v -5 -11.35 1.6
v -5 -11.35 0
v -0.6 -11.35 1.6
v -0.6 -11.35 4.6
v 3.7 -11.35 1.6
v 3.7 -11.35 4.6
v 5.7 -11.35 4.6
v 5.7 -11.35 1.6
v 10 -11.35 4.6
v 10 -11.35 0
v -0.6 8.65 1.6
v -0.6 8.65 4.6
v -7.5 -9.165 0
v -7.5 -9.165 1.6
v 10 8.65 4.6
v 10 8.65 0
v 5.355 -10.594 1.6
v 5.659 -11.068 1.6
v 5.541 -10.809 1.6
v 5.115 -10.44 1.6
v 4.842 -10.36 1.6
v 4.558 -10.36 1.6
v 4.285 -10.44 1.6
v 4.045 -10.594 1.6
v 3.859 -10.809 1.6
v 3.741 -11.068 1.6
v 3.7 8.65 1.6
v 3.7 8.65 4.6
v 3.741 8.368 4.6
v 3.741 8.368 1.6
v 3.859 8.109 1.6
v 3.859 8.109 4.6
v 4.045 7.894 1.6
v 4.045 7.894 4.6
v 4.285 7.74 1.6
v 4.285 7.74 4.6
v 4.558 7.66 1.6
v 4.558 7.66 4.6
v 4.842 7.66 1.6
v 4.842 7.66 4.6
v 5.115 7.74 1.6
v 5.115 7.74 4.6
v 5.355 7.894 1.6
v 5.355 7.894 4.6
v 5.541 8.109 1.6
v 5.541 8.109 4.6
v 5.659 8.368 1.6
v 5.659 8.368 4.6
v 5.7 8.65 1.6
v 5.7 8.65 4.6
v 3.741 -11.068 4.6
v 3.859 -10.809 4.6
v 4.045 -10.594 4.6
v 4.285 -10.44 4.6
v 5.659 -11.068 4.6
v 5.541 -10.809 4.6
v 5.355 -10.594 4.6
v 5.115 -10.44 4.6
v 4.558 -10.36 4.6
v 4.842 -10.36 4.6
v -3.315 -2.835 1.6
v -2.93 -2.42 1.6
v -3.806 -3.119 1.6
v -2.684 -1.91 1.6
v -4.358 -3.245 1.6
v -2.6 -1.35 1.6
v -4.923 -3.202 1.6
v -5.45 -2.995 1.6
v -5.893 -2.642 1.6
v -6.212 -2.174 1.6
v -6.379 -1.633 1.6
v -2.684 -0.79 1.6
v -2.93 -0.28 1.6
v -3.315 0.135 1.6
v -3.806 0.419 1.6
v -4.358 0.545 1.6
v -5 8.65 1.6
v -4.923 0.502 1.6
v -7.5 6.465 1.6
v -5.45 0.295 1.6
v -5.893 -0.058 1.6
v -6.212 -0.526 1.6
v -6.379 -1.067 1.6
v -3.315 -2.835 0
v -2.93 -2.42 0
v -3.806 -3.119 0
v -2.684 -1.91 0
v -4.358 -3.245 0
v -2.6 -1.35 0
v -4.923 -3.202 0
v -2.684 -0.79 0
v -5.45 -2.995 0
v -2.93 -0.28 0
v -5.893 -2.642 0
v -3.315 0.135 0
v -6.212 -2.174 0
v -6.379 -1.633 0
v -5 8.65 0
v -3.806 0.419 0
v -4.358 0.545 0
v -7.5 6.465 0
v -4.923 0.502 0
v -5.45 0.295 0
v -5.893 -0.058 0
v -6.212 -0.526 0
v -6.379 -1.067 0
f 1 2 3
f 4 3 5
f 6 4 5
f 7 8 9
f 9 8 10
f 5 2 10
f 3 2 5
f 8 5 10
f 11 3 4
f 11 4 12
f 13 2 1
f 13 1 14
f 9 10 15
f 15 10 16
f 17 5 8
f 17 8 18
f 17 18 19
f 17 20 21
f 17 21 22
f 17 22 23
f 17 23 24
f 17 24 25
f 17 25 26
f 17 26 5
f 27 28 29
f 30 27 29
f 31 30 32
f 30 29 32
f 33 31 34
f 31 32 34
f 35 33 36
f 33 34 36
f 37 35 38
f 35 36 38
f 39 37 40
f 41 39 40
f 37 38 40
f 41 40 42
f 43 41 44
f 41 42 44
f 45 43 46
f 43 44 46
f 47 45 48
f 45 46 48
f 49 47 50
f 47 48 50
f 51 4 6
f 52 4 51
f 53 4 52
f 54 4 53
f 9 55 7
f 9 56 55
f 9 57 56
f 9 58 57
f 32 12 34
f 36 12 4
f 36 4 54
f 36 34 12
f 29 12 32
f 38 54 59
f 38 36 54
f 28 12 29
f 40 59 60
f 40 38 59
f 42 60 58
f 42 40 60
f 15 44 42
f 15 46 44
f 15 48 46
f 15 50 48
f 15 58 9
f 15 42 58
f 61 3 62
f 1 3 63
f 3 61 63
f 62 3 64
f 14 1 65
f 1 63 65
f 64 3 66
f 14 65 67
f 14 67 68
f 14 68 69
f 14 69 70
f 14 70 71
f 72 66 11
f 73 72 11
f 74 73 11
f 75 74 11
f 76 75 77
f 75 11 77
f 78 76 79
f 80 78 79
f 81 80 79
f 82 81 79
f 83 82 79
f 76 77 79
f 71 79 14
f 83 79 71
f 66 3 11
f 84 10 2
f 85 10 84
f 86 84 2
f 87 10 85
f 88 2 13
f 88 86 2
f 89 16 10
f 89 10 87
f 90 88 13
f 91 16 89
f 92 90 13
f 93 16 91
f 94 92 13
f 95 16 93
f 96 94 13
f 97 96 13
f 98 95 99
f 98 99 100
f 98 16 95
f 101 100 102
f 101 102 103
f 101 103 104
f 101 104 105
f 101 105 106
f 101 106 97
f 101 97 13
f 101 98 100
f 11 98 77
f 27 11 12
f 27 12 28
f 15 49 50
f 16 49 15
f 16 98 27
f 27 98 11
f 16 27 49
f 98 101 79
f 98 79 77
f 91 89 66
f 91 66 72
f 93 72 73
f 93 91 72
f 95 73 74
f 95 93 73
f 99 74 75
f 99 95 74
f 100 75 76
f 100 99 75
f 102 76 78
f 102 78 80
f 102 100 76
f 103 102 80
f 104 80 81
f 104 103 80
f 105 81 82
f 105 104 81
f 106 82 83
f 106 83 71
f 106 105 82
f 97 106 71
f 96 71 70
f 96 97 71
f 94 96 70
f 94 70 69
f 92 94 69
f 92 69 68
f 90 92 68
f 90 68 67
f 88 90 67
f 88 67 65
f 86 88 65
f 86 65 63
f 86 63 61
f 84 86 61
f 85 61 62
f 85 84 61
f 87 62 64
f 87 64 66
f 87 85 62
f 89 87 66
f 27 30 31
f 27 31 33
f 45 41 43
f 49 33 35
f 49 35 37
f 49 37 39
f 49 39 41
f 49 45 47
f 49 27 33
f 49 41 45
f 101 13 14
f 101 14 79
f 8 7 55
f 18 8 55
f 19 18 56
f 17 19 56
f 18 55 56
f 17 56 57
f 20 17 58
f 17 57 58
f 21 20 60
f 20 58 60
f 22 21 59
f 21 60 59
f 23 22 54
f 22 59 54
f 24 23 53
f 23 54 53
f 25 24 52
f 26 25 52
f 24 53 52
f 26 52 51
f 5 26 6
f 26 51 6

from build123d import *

# Parameters (mm, degrees)
SKETCH1_R           = 1.9
BOSS_EXTRUDE1_DEPTH = 1.6
SKETCH2_W           = 10.6
SKETCH2_H           = 20
BOSS_EXTRUDE2_DEPTH = 3
SKETCH4_R           = 1
CUT_EXTRUDE1_DEPTH  = 3


with BuildPart() as part:
    # Sketch1 → Boss-Extrude1 (new body)
    with BuildSketch(Plane.XY):
        Polygon((-7.5, 6.464954653), (-5, 8.65), (10, 8.65), (10, -11.35), (-5, -11.35), (-7.5, -9.164954653), align=None)
        with Locations((-4.5, -1.35)):
            Circle(SKETCH1_R, mode=Mode.SUBTRACT)
    extrude(amount=BOSS_EXTRUDE1_DEPTH)

    # Sketch2 → Boss-Extrude2 (add)
    with BuildSketch(Plane.XY.offset(1.6)):
        with Locations((4.7, -1.35)):
            Rectangle(SKETCH2_W, SKETCH2_H)
    extrude(amount=BOSS_EXTRUDE2_DEPTH)

    # Sketch4 → Cut-Extrude1 (cut)
    with BuildSketch(Plane.XY.offset(4.6)):
        with Locations((4.7, -11.35)):
            Circle(SKETCH4_R)
        with Locations((4.7, 8.65)):
            Circle(SKETCH4_R)
    extrude(amount=-CUT_EXTRUDE1_DEPTH, mode=Mode.SUBTRACT)


solid = part.part
